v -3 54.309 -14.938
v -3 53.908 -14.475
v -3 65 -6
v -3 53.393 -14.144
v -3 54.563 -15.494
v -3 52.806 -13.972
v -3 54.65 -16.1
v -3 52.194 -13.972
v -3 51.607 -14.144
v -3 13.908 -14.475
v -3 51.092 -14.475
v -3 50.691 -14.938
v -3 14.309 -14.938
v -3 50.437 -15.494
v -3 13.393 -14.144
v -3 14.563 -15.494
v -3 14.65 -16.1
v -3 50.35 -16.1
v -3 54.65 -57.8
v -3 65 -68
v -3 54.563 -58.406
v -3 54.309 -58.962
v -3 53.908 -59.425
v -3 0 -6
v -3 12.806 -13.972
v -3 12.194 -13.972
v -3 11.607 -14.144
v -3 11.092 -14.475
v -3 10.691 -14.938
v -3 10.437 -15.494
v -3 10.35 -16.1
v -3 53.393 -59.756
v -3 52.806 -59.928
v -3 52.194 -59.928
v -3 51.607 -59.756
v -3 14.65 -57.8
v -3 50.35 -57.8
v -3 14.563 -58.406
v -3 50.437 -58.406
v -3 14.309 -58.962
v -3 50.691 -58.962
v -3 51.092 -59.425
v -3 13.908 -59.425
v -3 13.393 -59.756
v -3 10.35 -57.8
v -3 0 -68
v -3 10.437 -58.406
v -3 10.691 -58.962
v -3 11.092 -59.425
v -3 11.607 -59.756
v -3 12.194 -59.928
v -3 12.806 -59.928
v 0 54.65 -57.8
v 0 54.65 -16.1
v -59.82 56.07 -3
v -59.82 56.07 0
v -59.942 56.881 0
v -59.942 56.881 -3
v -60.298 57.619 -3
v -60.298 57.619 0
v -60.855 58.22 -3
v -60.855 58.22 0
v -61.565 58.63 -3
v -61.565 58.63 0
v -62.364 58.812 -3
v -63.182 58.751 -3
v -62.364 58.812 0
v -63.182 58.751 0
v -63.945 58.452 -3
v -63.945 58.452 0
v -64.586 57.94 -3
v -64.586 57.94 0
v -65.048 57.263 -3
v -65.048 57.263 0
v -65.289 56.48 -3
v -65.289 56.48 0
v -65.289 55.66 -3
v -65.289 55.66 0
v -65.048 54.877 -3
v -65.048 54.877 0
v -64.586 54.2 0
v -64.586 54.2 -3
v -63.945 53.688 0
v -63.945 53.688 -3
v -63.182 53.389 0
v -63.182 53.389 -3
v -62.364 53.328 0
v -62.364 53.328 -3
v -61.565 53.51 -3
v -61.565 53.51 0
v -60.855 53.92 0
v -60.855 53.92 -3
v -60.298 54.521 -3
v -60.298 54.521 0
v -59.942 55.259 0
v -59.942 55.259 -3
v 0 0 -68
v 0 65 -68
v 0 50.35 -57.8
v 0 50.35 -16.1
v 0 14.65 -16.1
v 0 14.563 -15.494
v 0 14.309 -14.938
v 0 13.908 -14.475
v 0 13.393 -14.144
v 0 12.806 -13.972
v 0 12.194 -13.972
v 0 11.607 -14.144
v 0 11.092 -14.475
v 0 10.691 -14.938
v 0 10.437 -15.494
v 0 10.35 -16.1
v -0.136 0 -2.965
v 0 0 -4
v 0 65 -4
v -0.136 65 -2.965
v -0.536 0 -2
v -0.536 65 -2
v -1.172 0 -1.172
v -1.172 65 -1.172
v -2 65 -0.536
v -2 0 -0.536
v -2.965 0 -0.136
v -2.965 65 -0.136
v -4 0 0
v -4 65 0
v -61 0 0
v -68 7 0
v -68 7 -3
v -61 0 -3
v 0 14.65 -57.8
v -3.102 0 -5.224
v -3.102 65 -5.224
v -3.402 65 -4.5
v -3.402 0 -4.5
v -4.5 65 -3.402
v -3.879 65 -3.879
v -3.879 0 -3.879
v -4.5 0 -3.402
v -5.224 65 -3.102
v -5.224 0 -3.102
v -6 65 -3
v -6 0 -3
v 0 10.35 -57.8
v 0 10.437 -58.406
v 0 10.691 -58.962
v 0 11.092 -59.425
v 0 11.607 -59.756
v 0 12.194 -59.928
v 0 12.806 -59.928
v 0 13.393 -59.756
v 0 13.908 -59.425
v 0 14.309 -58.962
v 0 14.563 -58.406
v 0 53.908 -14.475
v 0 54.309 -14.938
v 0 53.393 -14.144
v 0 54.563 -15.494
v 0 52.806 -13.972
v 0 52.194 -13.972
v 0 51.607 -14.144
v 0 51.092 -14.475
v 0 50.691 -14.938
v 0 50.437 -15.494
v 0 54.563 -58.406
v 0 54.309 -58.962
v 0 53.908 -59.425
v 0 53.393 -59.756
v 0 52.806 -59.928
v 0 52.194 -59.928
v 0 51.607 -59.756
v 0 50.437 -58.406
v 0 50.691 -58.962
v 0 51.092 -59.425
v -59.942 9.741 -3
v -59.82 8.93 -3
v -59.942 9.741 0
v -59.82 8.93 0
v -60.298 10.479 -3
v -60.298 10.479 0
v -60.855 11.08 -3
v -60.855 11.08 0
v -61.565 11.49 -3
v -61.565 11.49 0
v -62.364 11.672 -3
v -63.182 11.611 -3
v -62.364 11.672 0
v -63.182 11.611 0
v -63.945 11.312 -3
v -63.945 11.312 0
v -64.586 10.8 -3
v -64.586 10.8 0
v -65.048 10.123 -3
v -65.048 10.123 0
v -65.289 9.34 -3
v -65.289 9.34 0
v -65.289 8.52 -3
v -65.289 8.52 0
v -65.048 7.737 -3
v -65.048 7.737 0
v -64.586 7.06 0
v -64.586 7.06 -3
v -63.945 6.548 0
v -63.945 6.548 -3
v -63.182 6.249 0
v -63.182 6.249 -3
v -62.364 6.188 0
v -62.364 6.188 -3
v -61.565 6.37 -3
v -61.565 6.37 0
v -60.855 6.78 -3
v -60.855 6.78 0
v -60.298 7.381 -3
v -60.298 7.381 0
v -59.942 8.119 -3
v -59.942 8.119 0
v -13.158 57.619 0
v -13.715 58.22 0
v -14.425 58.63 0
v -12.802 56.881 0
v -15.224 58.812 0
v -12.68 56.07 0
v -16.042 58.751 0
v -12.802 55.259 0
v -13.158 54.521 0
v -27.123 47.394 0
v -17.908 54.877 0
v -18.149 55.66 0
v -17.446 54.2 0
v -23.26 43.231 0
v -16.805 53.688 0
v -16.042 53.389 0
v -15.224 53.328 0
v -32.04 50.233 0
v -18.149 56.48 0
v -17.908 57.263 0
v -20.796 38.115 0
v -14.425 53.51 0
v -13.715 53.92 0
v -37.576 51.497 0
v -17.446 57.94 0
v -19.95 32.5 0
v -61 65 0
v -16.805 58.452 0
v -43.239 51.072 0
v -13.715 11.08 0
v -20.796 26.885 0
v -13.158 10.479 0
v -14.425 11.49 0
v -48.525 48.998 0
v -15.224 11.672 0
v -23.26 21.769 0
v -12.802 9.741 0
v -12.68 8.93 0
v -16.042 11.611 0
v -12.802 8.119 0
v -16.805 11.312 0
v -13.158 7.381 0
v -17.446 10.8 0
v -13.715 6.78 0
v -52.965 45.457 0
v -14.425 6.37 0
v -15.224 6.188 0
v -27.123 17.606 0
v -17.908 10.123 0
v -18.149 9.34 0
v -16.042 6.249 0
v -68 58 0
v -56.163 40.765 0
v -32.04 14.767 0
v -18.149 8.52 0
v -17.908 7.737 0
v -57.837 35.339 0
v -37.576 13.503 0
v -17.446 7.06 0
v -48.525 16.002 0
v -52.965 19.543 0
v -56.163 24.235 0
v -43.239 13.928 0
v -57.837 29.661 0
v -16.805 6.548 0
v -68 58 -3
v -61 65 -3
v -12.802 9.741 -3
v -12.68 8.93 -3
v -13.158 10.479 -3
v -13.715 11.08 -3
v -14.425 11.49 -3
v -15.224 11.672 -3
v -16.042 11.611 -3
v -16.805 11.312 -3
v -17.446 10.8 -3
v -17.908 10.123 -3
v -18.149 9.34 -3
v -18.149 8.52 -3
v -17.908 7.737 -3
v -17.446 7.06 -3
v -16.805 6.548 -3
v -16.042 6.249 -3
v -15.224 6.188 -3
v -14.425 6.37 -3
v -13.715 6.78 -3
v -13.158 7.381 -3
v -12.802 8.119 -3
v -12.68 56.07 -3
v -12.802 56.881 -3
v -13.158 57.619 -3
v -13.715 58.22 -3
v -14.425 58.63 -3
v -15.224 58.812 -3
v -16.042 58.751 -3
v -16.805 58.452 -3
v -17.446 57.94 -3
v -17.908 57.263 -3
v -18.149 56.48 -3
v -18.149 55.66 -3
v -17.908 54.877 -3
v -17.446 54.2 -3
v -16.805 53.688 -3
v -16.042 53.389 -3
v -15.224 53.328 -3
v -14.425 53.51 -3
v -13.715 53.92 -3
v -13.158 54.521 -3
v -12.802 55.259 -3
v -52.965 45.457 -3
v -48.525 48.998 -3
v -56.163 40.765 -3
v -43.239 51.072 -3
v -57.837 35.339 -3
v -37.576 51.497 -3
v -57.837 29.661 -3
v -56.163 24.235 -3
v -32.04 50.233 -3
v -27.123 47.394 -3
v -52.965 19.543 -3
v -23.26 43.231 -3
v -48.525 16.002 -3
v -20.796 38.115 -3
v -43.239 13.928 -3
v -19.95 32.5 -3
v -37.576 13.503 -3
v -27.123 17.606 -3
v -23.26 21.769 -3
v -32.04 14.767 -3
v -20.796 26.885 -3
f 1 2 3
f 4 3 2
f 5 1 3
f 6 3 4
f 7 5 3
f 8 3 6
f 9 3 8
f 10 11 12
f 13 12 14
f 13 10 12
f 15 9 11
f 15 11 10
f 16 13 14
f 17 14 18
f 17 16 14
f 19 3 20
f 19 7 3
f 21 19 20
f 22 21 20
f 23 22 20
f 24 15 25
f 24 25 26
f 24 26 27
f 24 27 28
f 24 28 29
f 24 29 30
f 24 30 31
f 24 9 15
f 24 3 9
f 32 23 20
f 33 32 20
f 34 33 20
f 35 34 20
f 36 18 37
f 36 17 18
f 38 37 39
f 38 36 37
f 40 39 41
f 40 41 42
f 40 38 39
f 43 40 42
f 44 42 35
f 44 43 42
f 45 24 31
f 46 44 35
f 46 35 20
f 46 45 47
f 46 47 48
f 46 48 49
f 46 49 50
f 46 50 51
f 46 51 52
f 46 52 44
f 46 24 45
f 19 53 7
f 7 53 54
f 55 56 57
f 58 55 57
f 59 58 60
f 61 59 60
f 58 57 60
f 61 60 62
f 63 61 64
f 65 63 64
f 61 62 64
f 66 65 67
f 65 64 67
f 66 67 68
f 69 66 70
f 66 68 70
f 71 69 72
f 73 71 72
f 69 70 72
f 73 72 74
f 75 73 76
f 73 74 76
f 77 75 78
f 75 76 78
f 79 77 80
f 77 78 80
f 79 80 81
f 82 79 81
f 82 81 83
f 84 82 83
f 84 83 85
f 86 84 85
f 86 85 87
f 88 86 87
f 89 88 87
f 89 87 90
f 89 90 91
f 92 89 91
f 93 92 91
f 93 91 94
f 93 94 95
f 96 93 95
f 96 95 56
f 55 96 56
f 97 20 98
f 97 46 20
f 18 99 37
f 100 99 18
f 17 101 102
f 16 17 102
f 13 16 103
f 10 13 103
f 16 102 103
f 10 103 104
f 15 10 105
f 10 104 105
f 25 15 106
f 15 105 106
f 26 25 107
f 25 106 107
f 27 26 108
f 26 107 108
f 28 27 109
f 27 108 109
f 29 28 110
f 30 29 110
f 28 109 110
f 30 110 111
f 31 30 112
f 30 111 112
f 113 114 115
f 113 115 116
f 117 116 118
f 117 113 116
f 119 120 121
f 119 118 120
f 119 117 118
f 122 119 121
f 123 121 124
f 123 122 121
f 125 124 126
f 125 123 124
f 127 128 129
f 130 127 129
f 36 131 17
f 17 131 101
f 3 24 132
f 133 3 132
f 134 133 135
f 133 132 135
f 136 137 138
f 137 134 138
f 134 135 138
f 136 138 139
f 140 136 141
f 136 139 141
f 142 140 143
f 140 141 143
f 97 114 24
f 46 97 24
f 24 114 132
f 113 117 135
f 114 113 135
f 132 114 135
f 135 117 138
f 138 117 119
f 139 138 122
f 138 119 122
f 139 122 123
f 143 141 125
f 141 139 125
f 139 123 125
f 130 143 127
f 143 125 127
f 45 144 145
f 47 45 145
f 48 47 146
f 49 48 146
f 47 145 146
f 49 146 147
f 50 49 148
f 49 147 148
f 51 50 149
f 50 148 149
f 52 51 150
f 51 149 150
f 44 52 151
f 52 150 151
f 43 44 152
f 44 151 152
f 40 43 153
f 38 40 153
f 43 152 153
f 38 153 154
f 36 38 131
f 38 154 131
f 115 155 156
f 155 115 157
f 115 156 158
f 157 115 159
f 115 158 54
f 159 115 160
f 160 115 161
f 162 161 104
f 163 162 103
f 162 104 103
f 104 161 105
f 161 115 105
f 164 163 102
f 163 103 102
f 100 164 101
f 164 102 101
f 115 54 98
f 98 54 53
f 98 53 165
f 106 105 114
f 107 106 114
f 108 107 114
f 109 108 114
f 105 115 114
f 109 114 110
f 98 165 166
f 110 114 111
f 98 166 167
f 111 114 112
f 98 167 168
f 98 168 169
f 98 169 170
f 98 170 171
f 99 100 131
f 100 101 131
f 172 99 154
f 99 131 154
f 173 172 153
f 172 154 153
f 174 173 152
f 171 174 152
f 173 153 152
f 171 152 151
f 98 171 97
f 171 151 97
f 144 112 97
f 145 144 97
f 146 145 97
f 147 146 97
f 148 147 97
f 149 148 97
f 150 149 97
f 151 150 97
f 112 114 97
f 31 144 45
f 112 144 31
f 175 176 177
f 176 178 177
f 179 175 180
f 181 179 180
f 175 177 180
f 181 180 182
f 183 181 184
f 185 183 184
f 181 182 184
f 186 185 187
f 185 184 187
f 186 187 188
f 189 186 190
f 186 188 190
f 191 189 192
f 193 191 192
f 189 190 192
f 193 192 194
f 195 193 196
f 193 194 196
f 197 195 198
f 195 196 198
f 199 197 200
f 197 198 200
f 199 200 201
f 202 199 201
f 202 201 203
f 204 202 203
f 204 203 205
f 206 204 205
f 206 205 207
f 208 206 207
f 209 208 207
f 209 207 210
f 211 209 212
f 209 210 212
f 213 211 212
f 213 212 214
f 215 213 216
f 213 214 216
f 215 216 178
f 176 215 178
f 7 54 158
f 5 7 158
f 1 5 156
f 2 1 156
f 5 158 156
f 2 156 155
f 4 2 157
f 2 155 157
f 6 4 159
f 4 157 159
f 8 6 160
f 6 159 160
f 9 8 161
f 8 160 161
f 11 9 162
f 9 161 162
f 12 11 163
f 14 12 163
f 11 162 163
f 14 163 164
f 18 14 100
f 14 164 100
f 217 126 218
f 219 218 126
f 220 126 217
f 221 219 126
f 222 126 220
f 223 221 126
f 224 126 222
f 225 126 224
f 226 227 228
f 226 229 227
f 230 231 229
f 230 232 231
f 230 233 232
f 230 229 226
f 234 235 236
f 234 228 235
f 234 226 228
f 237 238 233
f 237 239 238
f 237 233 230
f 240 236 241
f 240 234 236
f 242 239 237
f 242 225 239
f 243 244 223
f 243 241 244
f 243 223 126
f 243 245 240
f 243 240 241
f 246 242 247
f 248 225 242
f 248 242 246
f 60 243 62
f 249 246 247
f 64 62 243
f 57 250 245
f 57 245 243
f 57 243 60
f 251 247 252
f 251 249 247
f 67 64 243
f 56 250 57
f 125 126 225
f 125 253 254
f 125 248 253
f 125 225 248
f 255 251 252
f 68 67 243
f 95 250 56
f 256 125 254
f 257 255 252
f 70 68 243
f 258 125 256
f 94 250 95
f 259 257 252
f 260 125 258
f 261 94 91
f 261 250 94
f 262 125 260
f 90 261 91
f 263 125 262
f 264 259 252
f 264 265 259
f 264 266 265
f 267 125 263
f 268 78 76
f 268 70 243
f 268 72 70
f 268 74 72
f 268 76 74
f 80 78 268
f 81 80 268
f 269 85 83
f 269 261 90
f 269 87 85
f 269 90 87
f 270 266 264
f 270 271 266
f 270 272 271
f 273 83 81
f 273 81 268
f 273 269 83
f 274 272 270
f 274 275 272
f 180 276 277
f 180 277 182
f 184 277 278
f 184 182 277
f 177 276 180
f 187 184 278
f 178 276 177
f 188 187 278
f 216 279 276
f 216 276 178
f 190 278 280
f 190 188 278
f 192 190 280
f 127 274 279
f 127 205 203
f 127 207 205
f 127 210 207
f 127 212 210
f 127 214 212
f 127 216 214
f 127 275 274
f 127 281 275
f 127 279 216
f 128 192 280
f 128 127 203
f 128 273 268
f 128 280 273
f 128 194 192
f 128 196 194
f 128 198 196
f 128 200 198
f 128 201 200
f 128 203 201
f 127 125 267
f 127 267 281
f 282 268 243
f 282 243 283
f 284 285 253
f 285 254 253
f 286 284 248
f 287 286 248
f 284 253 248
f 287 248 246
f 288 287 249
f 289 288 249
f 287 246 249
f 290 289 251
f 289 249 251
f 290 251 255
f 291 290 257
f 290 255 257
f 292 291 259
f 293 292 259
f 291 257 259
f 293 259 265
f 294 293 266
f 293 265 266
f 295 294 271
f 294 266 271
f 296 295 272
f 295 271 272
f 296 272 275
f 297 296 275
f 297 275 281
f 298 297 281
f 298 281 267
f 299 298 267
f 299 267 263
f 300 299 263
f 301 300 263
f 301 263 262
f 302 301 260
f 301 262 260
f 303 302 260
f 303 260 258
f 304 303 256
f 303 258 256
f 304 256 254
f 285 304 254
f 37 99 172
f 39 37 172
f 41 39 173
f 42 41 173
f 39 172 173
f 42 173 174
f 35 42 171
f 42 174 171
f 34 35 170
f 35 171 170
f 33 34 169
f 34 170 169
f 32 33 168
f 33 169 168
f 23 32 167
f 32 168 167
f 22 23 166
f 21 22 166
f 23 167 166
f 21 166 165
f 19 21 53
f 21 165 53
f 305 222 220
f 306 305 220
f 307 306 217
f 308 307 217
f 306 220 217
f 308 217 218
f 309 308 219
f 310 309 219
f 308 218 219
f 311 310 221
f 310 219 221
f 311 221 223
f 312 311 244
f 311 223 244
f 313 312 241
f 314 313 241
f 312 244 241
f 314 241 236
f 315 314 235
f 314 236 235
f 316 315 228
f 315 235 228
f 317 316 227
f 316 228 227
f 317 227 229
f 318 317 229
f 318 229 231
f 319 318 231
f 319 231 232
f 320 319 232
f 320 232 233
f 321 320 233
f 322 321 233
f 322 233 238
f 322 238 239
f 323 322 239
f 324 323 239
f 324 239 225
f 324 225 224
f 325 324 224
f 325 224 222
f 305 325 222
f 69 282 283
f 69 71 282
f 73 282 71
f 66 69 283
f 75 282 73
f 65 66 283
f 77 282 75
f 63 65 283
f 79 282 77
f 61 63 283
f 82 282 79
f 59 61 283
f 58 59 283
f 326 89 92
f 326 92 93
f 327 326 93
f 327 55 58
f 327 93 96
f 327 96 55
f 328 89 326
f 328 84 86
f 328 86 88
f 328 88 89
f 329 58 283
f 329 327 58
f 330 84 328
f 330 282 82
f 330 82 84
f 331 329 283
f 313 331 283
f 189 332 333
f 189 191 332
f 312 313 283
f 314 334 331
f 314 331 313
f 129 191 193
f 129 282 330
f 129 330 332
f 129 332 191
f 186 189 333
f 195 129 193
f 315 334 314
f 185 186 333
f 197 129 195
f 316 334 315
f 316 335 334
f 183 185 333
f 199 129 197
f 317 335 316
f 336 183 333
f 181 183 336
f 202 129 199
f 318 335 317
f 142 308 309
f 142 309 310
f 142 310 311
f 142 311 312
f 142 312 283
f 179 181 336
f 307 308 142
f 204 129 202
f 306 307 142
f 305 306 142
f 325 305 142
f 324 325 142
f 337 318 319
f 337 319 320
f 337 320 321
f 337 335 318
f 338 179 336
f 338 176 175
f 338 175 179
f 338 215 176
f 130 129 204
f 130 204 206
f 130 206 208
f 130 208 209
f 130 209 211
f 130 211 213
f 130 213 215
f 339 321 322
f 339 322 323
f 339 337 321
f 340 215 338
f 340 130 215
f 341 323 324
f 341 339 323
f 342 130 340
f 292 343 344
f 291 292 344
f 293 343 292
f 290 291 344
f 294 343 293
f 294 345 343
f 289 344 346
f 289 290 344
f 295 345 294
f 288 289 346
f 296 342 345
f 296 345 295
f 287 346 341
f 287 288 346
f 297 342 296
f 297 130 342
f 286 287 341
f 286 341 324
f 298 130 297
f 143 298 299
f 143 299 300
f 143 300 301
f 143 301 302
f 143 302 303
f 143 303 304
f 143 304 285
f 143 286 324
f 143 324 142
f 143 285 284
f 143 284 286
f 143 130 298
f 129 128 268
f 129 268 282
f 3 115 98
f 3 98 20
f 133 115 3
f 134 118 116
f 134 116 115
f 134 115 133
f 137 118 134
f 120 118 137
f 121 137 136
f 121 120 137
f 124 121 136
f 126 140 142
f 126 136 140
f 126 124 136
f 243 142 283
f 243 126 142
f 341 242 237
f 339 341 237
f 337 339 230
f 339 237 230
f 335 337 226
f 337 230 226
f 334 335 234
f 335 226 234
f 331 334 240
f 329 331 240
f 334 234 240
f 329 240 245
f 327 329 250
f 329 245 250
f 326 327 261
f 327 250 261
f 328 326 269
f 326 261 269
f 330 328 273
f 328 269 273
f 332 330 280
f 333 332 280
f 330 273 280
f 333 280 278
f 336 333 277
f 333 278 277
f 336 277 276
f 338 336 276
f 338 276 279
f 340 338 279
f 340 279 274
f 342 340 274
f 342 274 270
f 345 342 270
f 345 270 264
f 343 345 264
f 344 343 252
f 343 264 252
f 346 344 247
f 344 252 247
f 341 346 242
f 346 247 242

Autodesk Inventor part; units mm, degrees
ref_plane "YZ Plane" through (0, 0, 0) normal (1, 0, 0) x (0, 1, 0)
ref_plane "XZ Plane" through (0, 0, 0) normal (0, 1, 0) x (-1, 0, 0)
ref_plane "XY Plane" through (0, 0, 0) normal (0, 0, 1) x (1, 0, 0)
sketch "Sketch1" plane through (0, 0, 0) normal (0, 1, 0) x (-1, 0, 0)
  line L0 (4, 0) -> (68, 0)
  line L1 (0, -4) -> (0, -68)
  line L2 (68, -3) -> (6, -3)
  line L3 (3, -6) -> (3, -68)
  line L4 (68, 0) -> (68, -3)
  line L5 (3, -68) -> (0, -68)
  arc A0 (4, 0) -> (0, -4) centre (4, -4) ccw
  arc A1 (6, -3) -> (3, -6) centre (6, -6) ccw
  point P0 (0, 0)
  dimension "d0" = 68
  dimension "d1" = 68
  dimension "d2" = 3
  dimension "d3" = 4
  dimension "d4" = 3
extrude "Extrusion1" add sketch "Sketch1" along normal blind 65
sketch "Sketch2" plane through (-68, 0, 0) normal (0, 0, 1) x (1, 0, 0)
  circle A0 centre (29, 32.5) radius 19.05
  point P0 (68, 0)
  point P1 (0, 65)
  dimension "d8" = 38.1
extrude "Extrusion2" cut sketch "Sketch2" against normal blind 3
sketch "Sketch3" plane through (-68, 0, 0) normal (0, 0, 1) x (1, 0, 0)
  circle A0 centre (5.43, 8.93) radius 2.75
  point P0 (68, 0)
  dimension "d13" = 5.5
extrude "Extrusion3" cut sketch "Sketch3" against normal blind 3
pattern_linear "Rectangular Pattern1" count 2 spacing 47.14 along (0, 1, 0) count 2 spacing 47.14 along (1, 0, 0) of "Extrusion3"
sketch "Sketch4" plane through (0, 0, -4) normal (1, 0, 0) x (0, 0, -1)
  arc A0 (53.8, 50.35) -> (53.8, 54.65) centre (53.8, 52.5) ccw
  arc A1 (12.1, 54.65) -> (12.1, 50.35) centre (12.1, 52.5) ccw
  line L0 (53.8, 54.65) -> (12.1, 54.65)
  line L1 (53.8, 50.35) -> (12.1, 50.35)
  line L2 (46.8257, 32.5) -> (19.3775, 32.5)
  arc A2 (53.8, 10.35) -> (53.8, 14.65) centre (53.8, 12.5) ccw
  arc A3 (12.1, 14.65) -> (12.1, 10.35) centre (12.1, 12.5) ccw
  line L3 (53.8, 10.35) -> (12.1, 10.35)
  line L4 (53.8, 14.65) -> (12.1, 14.65)
  point P0 (-4, 0)
  dimension "d24" = 4.3
  dimension "d26" = 4.3
extrude "Extrusion4" cut sketch "Sketch4" against normal blind 3
chamfer "Chamfer1" distance 7 angle 45 2 edges at (-68, 65, -1.5) (-68, 0, -1.5)
properties part number "Soporte Motor"
